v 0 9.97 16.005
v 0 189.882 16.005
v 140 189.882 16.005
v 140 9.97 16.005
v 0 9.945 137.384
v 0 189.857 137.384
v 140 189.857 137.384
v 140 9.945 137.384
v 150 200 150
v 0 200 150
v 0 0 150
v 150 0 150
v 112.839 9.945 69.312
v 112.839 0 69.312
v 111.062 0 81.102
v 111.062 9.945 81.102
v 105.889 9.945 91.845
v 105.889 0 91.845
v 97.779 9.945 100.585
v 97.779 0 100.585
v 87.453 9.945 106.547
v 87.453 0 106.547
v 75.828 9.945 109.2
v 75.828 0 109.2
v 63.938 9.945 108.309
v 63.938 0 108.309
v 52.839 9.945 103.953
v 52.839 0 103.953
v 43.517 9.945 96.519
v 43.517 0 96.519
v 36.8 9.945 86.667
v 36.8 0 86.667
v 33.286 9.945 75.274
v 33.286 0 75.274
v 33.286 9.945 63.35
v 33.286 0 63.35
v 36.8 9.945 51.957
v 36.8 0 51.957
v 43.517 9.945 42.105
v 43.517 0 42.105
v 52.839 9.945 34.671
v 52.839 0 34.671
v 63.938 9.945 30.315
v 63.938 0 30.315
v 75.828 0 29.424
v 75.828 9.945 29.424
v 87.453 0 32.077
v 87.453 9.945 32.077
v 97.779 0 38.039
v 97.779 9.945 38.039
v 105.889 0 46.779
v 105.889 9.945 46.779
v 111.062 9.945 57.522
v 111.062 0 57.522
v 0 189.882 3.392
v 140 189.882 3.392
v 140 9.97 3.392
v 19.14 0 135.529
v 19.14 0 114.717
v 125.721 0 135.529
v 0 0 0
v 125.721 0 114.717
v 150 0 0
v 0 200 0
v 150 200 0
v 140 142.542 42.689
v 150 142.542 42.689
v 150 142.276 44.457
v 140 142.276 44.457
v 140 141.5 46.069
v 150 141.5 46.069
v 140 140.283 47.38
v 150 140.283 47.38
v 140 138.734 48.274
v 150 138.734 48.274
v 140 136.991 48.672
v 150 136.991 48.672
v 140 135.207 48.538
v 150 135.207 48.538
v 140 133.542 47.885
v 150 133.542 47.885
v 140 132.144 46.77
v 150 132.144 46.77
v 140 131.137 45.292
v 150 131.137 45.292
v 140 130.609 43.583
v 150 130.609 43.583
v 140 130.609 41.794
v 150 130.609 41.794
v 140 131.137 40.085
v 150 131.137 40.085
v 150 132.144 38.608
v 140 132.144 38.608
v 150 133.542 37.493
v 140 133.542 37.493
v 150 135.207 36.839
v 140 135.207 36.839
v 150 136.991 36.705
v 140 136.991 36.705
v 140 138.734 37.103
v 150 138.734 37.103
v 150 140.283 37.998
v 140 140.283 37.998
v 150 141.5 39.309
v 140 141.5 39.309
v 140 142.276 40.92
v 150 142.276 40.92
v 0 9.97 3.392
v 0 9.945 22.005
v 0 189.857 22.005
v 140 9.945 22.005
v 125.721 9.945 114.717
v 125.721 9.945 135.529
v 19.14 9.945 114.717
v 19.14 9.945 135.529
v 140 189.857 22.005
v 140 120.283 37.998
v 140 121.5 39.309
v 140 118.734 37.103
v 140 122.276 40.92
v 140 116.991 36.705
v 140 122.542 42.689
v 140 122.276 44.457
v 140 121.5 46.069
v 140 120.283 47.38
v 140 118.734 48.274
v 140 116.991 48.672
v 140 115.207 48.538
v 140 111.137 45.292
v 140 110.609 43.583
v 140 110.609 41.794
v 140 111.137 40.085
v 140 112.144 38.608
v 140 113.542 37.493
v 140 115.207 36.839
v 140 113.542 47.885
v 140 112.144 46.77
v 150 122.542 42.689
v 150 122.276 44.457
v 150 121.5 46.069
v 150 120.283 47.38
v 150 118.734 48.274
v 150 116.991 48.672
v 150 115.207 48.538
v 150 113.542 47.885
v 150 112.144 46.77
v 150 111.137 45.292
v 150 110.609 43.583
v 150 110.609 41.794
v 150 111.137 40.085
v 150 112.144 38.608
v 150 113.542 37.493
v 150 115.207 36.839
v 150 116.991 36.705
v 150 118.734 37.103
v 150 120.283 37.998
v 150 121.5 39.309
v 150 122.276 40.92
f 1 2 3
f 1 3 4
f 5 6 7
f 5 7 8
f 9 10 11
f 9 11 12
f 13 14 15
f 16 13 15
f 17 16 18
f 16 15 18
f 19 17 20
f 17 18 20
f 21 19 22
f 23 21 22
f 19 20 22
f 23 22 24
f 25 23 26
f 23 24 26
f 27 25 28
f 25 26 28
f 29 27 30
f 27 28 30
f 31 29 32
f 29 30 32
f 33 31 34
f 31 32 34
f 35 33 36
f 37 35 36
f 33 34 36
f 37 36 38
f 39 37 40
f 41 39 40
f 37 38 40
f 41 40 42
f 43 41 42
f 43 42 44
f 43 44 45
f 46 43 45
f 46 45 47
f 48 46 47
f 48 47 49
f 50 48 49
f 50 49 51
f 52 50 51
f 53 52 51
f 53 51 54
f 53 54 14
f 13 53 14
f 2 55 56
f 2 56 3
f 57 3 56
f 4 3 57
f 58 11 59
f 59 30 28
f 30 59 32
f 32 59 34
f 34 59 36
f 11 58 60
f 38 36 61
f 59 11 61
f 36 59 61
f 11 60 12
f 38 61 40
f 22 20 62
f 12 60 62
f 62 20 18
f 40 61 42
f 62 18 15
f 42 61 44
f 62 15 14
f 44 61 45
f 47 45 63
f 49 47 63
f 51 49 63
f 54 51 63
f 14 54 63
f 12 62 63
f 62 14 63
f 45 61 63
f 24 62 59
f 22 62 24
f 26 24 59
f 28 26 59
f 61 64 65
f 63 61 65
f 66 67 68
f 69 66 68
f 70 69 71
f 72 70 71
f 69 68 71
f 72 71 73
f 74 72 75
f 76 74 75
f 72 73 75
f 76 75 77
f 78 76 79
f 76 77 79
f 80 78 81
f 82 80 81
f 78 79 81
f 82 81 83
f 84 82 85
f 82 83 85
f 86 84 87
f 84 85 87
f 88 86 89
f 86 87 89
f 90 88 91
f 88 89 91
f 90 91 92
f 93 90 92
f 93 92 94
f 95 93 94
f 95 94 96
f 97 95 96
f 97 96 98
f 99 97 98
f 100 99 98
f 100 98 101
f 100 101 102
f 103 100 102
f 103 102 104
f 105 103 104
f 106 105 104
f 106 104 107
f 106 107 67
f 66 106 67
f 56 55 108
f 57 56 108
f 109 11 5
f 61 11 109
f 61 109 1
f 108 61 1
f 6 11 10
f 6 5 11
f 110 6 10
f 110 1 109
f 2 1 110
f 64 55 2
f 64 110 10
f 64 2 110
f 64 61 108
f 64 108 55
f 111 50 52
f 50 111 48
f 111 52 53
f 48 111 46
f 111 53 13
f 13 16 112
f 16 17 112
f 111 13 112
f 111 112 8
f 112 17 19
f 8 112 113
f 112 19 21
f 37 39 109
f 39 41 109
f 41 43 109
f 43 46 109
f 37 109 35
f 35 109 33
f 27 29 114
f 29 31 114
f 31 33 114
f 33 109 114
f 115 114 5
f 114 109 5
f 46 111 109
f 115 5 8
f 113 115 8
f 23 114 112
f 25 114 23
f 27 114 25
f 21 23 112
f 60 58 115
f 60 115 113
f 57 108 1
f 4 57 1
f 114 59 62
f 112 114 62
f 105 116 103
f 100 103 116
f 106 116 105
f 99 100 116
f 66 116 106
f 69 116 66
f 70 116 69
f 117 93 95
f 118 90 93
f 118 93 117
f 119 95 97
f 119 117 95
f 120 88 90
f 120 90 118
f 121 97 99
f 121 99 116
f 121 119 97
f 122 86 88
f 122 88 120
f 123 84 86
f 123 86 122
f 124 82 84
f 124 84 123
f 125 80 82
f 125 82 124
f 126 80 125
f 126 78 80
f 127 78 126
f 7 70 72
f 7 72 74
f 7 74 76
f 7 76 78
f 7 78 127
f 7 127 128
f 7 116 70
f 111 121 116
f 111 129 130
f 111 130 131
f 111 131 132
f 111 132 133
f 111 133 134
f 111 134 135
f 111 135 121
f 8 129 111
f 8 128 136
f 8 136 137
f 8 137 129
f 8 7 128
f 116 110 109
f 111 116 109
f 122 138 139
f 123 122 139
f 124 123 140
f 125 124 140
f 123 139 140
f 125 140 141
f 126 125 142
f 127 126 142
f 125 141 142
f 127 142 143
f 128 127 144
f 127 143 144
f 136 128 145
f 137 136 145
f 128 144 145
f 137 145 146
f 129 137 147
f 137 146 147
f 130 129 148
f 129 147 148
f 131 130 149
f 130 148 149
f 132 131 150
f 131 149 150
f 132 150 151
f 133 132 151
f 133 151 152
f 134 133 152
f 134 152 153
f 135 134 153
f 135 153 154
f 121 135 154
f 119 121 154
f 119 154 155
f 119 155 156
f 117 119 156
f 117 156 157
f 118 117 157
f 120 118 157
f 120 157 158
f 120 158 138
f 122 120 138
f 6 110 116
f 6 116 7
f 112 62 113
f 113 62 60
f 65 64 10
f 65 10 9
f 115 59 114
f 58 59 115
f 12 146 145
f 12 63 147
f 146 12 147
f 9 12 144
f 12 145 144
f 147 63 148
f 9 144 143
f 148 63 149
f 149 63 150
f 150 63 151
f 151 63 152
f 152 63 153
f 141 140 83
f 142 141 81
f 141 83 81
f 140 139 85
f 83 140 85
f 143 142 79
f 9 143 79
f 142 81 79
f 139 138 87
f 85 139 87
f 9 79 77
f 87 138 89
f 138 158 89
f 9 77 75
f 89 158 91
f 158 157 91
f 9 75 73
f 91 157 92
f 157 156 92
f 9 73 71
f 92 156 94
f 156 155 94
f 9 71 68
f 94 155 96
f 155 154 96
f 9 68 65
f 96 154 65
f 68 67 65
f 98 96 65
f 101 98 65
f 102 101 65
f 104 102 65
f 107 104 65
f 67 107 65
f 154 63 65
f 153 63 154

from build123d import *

# Parameters (mm, degrees)
BOX_W           = 150
BOX_H           = 200
BOX_DEPTH       = 150
SKETCH_W        = 179.911882
SKETCH_H        = 115.378512
SKETCH_W_2      = 179.911881
SKETCH_H_2      = 12.61254
POCKET_DEPTH    = 140
SKETCH001_R     = 40
SKETCH001_W     = 594.158722
SKETCH001_H     = 187.959229
SKETCH001_W_2   = 106.580839
SKETCH001_H_2   = 20.811958
POCKET001_DEPTH = 20
SKETCH002_R     = 6
POCKET002_DEPTH = 20


with BuildPart() as part:
    # Box → Box (new body)
    with BuildSketch(Plane.XY):
        with Locations((75, 100)):
            Rectangle(BOX_W, BOX_H)
    extrude(amount=BOX_DEPTH)

    # Sketch → Pocket (cut)
    with BuildSketch(Plane(origin=(0, 0, 0), x_dir=(0, -1, 0), z_dir=(-1, 0, 0))):
        with Locations((-99.900999, 79.694251)):
            Rectangle(SKETCH_W, SKETCH_H)
        with Locations((-99.925957, 9.698538)):
            Rectangle(SKETCH_W_2, SKETCH_H_2)
    extrude(amount=-POCKET_DEPTH, mode=Mode.SUBTRACT)

    # Sketch001 → Pocket001 (cut)
    with BuildSketch(Plane.XZ):
        with Locations((72.839142, 69.31189)):
            Circle(SKETCH001_R)
        with Locations((757.154067, 877.348939)):
            Rectangle(SKETCH001_W, SKETCH001_H)
        with Locations((72.430153, 125.12305)):
            Rectangle(SKETCH001_W_2, SKETCH001_H_2)
    extrude(amount=-POCKET001_DEPTH, mode=Mode.SUBTRACT)

    # Sketch002 → Pocket002 (cut)
    with BuildSketch(Plane.YZ.offset(150)):
        with Locations((116.542318, 42.688718)):
            Circle(SKETCH002_R)
        with Locations((136.542318, 42.688718)):
            Circle(SKETCH002_R)
    extrude(amount=-POCKET002_DEPTH, mode=Mode.SUBTRACT)


solid = part.part
